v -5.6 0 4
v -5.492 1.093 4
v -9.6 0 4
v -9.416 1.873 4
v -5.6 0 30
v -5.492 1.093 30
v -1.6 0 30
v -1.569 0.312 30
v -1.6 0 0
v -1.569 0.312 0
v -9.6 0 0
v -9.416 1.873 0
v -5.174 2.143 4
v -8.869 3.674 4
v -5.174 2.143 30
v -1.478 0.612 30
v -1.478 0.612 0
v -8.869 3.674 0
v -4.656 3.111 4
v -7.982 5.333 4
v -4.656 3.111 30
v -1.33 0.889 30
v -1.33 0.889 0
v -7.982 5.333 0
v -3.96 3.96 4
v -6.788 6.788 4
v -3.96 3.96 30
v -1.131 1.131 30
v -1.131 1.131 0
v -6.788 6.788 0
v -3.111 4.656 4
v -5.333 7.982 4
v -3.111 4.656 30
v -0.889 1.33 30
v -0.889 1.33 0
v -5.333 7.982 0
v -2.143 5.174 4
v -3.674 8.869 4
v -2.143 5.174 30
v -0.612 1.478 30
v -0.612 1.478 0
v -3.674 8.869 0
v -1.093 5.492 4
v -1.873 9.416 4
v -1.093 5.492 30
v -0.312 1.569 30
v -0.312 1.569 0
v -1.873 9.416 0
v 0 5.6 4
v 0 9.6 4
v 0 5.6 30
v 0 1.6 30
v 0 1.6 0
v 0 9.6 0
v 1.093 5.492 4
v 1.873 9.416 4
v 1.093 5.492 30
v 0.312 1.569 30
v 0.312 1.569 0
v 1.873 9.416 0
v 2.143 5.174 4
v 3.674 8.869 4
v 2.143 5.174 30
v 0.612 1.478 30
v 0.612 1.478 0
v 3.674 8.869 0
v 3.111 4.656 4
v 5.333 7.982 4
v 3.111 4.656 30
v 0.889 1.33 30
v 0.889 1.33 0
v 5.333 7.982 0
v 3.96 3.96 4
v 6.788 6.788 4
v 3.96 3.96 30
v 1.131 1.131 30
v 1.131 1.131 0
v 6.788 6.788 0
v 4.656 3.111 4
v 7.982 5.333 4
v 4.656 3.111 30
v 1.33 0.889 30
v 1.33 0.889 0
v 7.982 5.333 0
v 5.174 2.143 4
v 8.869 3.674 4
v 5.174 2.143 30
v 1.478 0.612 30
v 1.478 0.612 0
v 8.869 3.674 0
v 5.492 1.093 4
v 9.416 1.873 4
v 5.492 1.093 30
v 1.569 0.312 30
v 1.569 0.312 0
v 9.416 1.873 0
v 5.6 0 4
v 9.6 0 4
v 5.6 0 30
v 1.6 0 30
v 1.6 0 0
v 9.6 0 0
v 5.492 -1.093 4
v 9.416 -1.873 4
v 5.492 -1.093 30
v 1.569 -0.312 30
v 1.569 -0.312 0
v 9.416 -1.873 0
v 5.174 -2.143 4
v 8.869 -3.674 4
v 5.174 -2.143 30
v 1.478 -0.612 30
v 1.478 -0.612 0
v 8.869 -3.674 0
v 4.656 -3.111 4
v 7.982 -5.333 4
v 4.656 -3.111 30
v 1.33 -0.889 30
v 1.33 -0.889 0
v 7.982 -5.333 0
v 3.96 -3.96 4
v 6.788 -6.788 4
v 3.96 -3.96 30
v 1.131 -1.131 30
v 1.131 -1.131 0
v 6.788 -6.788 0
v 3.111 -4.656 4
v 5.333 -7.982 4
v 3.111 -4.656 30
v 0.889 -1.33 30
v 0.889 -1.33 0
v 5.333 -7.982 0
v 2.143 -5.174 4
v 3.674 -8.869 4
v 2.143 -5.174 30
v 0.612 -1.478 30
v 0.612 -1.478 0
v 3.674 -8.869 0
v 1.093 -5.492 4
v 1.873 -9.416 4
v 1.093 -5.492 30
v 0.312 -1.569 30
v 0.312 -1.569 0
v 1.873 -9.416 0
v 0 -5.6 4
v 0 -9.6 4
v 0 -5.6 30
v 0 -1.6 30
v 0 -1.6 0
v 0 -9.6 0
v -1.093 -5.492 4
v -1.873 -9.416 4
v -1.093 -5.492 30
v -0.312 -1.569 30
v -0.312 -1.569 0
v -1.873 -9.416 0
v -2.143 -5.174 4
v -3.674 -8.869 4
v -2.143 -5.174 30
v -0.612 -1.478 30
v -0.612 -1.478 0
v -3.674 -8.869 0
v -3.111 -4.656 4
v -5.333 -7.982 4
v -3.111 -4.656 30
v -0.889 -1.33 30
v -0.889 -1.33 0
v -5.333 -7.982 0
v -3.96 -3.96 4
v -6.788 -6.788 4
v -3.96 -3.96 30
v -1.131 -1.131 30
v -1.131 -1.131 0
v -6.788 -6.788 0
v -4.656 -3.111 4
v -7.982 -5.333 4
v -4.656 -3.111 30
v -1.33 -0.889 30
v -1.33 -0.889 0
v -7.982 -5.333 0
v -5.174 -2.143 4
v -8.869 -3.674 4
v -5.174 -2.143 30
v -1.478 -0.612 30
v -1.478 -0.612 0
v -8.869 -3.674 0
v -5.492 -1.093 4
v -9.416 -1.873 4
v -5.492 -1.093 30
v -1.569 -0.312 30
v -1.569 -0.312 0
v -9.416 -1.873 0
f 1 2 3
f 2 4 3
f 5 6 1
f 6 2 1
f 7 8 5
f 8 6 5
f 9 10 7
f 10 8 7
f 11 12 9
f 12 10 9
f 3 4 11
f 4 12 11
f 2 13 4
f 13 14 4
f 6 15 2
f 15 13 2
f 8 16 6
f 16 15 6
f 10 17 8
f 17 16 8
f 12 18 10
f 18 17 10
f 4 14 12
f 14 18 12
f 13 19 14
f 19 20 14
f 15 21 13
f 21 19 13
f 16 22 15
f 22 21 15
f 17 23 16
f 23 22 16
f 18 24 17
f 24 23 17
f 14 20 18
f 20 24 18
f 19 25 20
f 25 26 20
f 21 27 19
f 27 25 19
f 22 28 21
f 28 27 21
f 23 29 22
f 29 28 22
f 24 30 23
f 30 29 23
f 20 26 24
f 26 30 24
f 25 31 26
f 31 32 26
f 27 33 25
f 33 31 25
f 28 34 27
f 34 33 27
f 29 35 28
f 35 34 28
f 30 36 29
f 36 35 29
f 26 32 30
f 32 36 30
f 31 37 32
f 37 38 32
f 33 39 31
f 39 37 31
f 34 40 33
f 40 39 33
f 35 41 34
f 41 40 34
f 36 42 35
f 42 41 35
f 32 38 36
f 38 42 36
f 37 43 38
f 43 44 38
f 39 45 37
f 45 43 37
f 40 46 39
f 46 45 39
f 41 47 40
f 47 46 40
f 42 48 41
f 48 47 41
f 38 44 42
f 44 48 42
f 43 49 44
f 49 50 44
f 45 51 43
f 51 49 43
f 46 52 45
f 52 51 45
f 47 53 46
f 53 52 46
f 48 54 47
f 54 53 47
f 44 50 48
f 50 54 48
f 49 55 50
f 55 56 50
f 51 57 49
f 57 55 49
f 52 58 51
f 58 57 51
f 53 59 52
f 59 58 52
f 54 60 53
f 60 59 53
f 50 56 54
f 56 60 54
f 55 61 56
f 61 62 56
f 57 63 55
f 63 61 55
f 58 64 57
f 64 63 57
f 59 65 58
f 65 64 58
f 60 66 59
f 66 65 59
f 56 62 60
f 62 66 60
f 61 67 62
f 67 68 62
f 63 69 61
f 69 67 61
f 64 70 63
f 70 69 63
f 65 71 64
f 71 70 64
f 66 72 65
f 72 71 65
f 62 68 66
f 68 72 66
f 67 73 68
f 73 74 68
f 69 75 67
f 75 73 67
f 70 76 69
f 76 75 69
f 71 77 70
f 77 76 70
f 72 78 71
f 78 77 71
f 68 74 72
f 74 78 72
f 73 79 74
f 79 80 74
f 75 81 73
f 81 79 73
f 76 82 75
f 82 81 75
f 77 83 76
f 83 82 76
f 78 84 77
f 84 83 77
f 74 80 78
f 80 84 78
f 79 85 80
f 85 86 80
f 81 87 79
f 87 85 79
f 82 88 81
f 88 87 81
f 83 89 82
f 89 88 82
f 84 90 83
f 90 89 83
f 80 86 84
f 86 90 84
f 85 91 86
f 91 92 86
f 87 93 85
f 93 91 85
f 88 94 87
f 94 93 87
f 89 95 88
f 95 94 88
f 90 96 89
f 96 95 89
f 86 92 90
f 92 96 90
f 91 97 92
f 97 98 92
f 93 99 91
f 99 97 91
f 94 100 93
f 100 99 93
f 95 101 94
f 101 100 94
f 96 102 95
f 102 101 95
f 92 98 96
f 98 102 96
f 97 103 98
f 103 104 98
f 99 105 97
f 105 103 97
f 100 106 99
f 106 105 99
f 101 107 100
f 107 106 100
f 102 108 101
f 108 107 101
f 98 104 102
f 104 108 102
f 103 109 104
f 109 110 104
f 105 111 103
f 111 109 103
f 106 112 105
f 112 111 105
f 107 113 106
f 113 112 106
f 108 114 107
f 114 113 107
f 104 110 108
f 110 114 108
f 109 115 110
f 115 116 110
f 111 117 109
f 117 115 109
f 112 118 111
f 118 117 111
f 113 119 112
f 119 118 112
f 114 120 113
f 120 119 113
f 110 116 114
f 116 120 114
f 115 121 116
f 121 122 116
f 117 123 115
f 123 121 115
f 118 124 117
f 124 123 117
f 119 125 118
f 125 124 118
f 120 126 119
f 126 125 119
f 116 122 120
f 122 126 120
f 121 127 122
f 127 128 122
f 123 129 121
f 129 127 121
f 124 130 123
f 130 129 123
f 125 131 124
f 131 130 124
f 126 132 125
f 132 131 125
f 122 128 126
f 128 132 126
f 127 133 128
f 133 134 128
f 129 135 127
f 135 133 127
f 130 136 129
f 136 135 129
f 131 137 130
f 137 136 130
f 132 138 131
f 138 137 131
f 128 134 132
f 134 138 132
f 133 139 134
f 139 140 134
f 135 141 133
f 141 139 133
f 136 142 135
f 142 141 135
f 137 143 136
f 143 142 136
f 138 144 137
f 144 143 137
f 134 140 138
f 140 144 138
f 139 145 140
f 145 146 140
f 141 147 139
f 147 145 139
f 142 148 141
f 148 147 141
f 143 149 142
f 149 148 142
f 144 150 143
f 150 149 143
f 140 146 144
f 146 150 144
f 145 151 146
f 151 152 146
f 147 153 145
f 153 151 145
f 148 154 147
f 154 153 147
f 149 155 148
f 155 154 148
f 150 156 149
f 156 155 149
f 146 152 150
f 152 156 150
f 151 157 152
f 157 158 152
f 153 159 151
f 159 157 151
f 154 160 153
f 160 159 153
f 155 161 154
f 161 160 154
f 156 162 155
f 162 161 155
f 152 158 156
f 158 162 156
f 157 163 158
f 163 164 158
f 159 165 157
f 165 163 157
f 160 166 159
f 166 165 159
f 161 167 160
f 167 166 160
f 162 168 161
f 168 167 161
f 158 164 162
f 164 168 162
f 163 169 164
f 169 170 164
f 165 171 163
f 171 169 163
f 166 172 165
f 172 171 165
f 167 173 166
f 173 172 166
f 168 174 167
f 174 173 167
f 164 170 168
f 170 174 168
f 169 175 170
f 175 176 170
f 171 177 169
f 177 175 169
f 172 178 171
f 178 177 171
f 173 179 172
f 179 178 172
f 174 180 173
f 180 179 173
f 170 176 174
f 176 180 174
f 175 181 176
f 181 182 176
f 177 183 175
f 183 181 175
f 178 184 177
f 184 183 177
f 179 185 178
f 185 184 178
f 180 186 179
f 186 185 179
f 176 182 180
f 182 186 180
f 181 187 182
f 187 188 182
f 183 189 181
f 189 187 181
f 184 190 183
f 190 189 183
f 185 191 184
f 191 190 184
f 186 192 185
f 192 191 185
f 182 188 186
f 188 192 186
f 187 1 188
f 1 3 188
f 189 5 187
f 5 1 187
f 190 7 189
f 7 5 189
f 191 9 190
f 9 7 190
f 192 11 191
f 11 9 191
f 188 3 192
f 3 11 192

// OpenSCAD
$fn = 32;

// ----------------------------------------------------------------------
// Profiled standoff: flanged spacer, 30 mm long, bore 3.2 mm
// ----------------------------------------------------------------------

// --- parameters (mm) ---
revolve_angle = 360;      // full turn around the Z axis
profile_points = 6;       // points of the closed outline

profile = [[1.6, 0], [9.6, 0], [9.6, 4], [5.6, 4], [5.6, 30], [1.6, 30]];  // single closed polygon, 6 points, counter clockwise

// --- the one profile operation ---
rotate_extrude(angle = revolve_angle) polygon(points = profile);
